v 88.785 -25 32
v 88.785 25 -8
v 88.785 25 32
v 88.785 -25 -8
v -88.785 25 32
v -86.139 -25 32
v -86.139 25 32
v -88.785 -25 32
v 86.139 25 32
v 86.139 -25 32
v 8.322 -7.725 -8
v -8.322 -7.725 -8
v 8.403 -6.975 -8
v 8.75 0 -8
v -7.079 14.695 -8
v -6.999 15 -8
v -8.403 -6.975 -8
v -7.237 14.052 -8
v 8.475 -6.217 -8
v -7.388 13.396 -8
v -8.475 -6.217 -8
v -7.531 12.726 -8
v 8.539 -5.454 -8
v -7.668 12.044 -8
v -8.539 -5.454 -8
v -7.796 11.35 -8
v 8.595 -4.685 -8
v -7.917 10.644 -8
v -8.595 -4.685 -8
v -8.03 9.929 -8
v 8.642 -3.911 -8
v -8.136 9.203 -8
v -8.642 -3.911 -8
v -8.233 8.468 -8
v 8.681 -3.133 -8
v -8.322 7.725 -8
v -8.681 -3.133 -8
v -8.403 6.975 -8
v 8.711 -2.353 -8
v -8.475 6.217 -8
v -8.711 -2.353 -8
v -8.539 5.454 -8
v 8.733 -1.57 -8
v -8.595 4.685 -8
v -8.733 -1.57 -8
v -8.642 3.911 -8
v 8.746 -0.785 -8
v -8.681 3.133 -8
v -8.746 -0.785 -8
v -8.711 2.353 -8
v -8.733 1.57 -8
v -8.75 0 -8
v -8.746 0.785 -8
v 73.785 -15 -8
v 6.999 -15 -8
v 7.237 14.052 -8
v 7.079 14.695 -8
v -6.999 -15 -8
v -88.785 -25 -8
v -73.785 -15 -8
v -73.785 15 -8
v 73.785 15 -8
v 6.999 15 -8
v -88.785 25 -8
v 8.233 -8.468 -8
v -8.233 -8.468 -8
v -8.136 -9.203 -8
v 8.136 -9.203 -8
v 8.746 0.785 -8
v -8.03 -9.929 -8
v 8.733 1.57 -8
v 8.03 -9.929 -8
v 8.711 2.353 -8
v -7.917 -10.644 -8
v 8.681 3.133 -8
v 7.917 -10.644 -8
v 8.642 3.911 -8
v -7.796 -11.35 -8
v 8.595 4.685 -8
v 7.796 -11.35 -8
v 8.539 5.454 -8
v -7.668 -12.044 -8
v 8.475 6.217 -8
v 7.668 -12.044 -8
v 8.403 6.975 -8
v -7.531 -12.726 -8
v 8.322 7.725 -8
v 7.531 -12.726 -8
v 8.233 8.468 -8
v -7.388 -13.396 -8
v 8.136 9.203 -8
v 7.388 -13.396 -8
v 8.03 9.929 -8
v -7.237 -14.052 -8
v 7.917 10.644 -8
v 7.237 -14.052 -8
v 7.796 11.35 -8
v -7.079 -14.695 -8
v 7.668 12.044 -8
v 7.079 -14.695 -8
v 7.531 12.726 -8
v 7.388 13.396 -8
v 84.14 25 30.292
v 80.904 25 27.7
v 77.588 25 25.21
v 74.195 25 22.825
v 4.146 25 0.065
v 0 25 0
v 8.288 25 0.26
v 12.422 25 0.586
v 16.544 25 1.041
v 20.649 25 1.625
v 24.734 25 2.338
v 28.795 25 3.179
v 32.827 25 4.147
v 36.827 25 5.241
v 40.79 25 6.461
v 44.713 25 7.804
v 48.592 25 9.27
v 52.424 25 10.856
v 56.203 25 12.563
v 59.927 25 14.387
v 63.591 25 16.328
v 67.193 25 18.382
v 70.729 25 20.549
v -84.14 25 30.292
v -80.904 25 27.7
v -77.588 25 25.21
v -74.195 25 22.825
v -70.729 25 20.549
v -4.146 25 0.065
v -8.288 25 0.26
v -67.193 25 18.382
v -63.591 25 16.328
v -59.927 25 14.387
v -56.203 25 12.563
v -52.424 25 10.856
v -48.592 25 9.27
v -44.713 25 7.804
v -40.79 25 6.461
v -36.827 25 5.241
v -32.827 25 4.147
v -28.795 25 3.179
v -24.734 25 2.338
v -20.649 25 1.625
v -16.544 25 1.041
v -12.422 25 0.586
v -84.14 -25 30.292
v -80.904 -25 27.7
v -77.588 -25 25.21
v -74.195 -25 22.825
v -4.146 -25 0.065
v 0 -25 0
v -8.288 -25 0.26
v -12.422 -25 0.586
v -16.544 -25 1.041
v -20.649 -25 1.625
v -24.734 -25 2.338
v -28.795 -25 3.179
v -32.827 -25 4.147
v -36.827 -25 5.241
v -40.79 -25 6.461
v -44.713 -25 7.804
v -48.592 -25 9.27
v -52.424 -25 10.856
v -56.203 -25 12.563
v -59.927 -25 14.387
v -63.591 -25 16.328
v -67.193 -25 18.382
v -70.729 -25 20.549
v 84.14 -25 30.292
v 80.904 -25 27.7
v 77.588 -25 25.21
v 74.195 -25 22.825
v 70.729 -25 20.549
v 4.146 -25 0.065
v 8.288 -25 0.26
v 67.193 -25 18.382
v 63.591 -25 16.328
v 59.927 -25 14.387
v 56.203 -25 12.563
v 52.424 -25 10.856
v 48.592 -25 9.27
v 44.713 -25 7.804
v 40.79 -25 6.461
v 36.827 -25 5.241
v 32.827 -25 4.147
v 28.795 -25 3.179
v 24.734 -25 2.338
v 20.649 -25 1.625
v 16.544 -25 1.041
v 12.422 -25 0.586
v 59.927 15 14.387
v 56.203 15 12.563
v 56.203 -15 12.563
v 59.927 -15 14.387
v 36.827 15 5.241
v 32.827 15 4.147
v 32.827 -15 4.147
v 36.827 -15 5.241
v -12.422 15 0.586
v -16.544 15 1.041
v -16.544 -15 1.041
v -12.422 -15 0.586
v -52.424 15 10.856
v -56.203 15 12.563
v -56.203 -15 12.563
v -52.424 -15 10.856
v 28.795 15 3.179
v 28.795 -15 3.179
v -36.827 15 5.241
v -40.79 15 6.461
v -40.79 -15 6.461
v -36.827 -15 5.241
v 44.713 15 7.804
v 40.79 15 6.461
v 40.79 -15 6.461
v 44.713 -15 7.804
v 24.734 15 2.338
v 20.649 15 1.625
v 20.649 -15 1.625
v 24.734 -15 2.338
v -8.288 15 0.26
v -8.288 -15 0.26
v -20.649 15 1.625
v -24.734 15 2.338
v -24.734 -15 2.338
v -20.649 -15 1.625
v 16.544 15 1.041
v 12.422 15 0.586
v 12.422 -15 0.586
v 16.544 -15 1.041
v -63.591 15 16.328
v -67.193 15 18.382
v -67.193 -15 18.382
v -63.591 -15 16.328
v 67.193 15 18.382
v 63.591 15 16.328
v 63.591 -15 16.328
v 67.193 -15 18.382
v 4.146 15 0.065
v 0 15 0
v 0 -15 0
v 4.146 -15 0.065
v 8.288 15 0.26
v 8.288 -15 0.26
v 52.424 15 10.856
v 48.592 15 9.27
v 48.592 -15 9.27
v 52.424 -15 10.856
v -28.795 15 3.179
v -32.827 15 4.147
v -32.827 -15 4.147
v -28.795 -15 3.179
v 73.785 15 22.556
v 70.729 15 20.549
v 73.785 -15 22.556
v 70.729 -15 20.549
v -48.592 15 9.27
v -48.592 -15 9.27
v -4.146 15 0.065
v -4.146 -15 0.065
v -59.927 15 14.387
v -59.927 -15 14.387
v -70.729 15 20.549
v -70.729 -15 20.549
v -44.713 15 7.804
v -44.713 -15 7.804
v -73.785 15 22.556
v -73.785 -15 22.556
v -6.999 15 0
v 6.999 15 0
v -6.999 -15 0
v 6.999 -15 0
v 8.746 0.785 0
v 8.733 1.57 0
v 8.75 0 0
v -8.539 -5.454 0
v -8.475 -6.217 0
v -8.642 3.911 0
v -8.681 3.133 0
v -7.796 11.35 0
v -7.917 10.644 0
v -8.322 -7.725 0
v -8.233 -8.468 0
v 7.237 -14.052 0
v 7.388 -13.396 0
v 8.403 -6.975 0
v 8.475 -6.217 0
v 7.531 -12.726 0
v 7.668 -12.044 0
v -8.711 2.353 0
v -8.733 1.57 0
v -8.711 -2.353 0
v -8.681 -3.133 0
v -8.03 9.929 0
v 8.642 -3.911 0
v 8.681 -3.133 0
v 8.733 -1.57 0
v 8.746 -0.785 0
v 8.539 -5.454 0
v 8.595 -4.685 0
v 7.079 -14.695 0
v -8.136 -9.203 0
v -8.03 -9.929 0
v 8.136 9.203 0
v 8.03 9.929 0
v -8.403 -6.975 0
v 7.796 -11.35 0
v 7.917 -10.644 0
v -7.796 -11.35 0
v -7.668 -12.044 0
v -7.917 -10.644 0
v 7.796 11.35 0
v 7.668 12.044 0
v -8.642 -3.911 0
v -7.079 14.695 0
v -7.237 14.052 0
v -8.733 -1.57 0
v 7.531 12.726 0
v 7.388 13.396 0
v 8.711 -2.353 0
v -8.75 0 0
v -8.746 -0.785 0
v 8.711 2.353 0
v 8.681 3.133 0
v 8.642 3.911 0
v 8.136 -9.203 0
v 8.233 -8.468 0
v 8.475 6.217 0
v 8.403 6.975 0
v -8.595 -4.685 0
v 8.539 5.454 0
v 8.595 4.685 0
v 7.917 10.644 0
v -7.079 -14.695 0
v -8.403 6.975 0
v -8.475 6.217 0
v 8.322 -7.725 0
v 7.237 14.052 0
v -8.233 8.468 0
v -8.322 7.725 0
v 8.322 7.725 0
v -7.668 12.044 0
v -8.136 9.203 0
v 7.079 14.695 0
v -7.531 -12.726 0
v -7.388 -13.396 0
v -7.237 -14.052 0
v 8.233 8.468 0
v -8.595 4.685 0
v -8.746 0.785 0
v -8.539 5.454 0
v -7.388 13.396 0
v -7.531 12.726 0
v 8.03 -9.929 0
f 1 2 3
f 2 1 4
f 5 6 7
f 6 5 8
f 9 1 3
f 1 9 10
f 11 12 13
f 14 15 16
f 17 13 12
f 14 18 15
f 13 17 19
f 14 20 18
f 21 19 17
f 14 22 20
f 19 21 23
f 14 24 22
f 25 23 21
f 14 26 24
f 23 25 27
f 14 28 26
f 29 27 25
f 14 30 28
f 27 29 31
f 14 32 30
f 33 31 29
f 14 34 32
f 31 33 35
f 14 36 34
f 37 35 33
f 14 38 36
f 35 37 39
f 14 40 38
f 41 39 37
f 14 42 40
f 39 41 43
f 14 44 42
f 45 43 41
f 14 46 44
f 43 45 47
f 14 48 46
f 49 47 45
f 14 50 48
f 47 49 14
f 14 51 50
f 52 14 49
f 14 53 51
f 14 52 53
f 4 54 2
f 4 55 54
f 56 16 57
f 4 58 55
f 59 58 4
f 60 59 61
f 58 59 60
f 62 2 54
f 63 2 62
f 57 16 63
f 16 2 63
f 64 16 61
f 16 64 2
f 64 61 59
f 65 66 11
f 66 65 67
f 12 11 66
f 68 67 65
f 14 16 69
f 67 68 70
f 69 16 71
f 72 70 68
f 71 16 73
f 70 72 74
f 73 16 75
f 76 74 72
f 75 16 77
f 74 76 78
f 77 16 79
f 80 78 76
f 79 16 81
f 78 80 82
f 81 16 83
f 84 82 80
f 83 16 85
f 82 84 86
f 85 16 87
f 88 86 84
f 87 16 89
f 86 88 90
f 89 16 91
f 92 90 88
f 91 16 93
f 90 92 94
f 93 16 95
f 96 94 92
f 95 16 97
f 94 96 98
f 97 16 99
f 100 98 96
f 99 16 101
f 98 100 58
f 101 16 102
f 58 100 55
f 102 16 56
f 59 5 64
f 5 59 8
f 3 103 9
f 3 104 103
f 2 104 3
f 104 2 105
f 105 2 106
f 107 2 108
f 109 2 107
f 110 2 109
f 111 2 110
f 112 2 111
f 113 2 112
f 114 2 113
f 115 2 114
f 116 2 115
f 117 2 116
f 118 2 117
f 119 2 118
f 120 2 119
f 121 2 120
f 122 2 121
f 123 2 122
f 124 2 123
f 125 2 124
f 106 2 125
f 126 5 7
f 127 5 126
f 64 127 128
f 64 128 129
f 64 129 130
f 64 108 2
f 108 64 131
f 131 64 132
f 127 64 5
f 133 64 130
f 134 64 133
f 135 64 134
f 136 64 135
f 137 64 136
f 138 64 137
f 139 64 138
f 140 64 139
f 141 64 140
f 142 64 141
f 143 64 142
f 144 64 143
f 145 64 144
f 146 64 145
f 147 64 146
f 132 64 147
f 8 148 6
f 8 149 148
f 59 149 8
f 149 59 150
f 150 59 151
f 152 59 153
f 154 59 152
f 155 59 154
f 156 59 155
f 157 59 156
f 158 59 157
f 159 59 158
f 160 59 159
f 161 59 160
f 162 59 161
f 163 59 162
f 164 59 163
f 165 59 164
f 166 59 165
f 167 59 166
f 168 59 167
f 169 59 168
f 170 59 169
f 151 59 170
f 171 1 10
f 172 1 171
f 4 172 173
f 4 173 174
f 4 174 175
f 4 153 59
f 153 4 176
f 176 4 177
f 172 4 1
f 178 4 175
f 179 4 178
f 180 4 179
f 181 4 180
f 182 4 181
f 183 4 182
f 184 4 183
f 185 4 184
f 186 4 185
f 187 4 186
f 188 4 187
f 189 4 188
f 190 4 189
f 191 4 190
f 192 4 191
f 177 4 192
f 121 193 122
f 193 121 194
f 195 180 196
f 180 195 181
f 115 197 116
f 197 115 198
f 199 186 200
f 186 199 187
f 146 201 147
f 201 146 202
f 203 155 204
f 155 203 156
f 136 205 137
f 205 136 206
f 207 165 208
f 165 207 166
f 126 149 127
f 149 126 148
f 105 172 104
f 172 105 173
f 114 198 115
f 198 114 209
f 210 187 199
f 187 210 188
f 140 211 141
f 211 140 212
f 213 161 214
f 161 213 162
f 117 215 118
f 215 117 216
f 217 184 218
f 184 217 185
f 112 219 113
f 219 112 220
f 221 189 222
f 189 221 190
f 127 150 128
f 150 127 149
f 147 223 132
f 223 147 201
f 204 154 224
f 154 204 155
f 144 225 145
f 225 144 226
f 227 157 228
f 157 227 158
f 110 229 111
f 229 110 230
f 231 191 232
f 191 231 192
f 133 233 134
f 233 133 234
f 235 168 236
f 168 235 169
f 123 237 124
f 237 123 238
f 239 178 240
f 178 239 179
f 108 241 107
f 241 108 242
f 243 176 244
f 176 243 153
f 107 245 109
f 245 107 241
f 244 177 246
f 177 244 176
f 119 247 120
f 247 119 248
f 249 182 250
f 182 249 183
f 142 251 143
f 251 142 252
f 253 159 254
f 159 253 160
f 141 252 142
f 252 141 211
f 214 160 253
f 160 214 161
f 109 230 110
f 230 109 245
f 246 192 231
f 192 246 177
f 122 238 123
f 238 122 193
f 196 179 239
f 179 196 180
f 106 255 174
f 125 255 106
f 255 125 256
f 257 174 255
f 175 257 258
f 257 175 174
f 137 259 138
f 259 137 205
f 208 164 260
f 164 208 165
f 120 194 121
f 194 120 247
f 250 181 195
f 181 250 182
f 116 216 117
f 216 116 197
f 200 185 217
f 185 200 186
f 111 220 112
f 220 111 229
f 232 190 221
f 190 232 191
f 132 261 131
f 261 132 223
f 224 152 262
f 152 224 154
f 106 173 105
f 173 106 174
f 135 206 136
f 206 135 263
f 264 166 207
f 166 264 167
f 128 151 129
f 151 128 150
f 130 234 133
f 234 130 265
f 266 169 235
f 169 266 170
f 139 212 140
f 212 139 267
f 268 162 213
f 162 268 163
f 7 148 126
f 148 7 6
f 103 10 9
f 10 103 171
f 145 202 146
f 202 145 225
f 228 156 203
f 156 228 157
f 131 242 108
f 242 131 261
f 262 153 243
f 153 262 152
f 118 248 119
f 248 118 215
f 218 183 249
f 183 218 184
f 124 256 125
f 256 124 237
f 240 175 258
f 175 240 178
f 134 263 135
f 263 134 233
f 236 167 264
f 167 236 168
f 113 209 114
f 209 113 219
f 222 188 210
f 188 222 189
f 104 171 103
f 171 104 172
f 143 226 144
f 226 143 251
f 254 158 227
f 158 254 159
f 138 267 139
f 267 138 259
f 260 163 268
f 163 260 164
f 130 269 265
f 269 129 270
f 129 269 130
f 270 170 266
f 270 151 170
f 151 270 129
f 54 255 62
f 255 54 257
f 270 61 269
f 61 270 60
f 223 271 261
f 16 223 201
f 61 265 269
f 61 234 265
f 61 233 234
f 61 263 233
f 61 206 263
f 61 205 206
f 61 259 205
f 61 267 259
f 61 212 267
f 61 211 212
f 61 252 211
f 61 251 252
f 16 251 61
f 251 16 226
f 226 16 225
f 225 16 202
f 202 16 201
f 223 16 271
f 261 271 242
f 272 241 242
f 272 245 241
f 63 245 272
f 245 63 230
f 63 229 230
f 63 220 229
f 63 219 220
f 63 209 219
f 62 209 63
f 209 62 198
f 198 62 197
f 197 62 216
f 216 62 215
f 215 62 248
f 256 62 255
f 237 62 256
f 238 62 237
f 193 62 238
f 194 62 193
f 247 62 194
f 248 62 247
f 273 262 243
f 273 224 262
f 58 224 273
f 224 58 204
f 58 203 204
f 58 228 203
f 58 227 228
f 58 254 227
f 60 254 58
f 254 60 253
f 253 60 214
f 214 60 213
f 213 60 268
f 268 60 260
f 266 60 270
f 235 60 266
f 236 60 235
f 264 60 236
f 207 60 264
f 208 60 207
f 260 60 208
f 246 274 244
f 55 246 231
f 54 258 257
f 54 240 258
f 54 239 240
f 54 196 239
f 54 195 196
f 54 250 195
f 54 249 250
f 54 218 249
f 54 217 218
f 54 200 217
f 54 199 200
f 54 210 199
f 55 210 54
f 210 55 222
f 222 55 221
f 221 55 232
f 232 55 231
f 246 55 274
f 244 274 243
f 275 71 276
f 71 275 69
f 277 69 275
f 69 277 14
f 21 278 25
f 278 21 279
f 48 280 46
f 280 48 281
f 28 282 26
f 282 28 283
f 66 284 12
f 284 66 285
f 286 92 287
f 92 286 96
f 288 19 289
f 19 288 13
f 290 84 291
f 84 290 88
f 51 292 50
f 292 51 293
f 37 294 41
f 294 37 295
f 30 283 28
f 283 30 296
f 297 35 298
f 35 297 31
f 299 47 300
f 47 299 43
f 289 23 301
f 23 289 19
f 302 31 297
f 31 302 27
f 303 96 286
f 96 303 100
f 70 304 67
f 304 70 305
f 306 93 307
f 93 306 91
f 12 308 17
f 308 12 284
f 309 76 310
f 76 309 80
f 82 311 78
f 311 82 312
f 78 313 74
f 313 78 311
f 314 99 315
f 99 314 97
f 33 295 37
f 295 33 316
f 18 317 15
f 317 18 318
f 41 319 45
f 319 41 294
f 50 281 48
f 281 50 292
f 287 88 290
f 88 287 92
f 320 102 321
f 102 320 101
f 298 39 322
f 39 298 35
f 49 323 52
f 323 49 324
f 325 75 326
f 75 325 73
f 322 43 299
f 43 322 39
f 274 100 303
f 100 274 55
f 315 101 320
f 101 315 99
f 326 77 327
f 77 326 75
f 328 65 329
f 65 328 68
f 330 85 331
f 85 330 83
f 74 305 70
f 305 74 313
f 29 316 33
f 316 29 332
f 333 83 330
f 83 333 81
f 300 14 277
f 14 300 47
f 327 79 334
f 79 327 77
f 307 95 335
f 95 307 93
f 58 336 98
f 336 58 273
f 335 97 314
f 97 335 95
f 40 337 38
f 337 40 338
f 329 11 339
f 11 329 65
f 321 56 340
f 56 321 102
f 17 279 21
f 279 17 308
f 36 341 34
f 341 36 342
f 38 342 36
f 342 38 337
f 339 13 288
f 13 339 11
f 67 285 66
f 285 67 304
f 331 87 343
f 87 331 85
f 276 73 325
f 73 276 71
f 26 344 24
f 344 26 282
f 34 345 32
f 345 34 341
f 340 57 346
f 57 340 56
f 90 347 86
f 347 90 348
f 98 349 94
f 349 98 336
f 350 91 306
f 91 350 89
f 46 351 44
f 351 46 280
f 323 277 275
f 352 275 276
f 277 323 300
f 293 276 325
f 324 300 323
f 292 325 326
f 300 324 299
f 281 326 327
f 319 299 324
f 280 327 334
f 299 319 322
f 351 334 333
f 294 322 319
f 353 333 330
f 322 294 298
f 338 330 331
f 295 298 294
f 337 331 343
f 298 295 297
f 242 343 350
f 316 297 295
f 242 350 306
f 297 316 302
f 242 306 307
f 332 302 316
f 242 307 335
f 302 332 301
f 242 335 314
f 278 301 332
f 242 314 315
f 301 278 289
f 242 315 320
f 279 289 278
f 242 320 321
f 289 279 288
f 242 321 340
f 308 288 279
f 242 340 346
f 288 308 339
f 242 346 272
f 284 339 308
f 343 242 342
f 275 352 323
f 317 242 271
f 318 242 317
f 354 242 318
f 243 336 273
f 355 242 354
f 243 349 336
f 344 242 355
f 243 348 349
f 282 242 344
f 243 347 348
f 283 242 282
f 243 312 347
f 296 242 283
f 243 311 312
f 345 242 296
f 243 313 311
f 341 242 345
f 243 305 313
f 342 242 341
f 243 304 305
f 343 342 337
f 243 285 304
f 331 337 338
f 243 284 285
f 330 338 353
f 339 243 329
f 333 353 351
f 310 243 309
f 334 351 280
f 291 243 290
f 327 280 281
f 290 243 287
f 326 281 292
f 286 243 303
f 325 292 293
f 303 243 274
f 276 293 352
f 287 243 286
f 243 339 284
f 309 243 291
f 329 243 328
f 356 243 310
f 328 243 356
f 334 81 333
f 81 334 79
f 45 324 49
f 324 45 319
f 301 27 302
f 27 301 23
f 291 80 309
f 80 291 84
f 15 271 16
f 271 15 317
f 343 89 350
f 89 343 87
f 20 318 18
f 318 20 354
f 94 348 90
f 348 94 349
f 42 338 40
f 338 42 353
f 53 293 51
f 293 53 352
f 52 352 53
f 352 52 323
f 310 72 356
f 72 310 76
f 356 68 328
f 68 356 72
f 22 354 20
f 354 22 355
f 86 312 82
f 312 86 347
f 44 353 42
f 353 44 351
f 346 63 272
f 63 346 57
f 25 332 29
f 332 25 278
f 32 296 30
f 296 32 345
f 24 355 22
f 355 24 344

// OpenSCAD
r_objeto = 130;
delta_r = 2;

z_ombro = 30;
x_ombro = 2 * sqrt( ( r_objeto + delta_r ) ^ 2 - ( z_ombro - ( r_objeto + delta_r ) ) ^ 2 );
//x_ombro = 2 * sqrt( r_objeto ^ 2 - ( z_ombro - r_objeto ) ^ 2 );
echo( x_ombro );
y_ombro = 50;
f_ombro = 8;
d_ombro = 5;

ponte_x = 15;
ponte_y = 10;
x_furo = x_ombro + 2 * d_ombro - 2 * ponte_x;
y_furo = y_ombro - 2 * ponte_y;

//x_furo = 0.9 * x_ombro;
//y_furo = 0.6 * y_ombro;
//// Largura das "pontes"
//echo( ( y_ombro - y_furo ) / 2 );
//echo( ( x_ombro - x_furo ) / 2 + d_ombro );

z_furo = 2 * z_ombro + f_ombro + 1;

difference(){
    translate( [ -x_ombro / 2 - d_ombro, -y_ombro / 2, -f_ombro ] )
        cube( [ x_ombro + 2 * d_ombro, y_ombro, z_ombro + f_ombro + delta_r ] );
    
    translate( [ 0, 0.55 * y_ombro, r_objeto + delta_r ] )
        rotate( 90, [ 1, 0, 0 ] )
            cylinder( r = r_objeto + delta_r, h = 1.1 * y_ombro, $fn = 200 );
    
    translate( [ -x_furo / 2, -y_furo / 2, -f_ombro - 0.5 ] )
        cube( [ x_furo, y_furo, z_furo ] );
}

translate( [ 0, 0, -f_ombro ] )
    scale( [ 0.35, 1, 1 ] )
        cylinder( d = y_ombro, h = f_ombro, $fn = 200 );
// Cubo para completar os 8mm que deveria ter tido o modelo:
// No código acima já está corrigido.
//translate( [ -x_ombro / 2 - d_ombro, -y_ombro / 2, 0 ] )
//    cube( [ x_ombro + 2 * d_ombro, y_ombro, f_ombro - 3 ] );
